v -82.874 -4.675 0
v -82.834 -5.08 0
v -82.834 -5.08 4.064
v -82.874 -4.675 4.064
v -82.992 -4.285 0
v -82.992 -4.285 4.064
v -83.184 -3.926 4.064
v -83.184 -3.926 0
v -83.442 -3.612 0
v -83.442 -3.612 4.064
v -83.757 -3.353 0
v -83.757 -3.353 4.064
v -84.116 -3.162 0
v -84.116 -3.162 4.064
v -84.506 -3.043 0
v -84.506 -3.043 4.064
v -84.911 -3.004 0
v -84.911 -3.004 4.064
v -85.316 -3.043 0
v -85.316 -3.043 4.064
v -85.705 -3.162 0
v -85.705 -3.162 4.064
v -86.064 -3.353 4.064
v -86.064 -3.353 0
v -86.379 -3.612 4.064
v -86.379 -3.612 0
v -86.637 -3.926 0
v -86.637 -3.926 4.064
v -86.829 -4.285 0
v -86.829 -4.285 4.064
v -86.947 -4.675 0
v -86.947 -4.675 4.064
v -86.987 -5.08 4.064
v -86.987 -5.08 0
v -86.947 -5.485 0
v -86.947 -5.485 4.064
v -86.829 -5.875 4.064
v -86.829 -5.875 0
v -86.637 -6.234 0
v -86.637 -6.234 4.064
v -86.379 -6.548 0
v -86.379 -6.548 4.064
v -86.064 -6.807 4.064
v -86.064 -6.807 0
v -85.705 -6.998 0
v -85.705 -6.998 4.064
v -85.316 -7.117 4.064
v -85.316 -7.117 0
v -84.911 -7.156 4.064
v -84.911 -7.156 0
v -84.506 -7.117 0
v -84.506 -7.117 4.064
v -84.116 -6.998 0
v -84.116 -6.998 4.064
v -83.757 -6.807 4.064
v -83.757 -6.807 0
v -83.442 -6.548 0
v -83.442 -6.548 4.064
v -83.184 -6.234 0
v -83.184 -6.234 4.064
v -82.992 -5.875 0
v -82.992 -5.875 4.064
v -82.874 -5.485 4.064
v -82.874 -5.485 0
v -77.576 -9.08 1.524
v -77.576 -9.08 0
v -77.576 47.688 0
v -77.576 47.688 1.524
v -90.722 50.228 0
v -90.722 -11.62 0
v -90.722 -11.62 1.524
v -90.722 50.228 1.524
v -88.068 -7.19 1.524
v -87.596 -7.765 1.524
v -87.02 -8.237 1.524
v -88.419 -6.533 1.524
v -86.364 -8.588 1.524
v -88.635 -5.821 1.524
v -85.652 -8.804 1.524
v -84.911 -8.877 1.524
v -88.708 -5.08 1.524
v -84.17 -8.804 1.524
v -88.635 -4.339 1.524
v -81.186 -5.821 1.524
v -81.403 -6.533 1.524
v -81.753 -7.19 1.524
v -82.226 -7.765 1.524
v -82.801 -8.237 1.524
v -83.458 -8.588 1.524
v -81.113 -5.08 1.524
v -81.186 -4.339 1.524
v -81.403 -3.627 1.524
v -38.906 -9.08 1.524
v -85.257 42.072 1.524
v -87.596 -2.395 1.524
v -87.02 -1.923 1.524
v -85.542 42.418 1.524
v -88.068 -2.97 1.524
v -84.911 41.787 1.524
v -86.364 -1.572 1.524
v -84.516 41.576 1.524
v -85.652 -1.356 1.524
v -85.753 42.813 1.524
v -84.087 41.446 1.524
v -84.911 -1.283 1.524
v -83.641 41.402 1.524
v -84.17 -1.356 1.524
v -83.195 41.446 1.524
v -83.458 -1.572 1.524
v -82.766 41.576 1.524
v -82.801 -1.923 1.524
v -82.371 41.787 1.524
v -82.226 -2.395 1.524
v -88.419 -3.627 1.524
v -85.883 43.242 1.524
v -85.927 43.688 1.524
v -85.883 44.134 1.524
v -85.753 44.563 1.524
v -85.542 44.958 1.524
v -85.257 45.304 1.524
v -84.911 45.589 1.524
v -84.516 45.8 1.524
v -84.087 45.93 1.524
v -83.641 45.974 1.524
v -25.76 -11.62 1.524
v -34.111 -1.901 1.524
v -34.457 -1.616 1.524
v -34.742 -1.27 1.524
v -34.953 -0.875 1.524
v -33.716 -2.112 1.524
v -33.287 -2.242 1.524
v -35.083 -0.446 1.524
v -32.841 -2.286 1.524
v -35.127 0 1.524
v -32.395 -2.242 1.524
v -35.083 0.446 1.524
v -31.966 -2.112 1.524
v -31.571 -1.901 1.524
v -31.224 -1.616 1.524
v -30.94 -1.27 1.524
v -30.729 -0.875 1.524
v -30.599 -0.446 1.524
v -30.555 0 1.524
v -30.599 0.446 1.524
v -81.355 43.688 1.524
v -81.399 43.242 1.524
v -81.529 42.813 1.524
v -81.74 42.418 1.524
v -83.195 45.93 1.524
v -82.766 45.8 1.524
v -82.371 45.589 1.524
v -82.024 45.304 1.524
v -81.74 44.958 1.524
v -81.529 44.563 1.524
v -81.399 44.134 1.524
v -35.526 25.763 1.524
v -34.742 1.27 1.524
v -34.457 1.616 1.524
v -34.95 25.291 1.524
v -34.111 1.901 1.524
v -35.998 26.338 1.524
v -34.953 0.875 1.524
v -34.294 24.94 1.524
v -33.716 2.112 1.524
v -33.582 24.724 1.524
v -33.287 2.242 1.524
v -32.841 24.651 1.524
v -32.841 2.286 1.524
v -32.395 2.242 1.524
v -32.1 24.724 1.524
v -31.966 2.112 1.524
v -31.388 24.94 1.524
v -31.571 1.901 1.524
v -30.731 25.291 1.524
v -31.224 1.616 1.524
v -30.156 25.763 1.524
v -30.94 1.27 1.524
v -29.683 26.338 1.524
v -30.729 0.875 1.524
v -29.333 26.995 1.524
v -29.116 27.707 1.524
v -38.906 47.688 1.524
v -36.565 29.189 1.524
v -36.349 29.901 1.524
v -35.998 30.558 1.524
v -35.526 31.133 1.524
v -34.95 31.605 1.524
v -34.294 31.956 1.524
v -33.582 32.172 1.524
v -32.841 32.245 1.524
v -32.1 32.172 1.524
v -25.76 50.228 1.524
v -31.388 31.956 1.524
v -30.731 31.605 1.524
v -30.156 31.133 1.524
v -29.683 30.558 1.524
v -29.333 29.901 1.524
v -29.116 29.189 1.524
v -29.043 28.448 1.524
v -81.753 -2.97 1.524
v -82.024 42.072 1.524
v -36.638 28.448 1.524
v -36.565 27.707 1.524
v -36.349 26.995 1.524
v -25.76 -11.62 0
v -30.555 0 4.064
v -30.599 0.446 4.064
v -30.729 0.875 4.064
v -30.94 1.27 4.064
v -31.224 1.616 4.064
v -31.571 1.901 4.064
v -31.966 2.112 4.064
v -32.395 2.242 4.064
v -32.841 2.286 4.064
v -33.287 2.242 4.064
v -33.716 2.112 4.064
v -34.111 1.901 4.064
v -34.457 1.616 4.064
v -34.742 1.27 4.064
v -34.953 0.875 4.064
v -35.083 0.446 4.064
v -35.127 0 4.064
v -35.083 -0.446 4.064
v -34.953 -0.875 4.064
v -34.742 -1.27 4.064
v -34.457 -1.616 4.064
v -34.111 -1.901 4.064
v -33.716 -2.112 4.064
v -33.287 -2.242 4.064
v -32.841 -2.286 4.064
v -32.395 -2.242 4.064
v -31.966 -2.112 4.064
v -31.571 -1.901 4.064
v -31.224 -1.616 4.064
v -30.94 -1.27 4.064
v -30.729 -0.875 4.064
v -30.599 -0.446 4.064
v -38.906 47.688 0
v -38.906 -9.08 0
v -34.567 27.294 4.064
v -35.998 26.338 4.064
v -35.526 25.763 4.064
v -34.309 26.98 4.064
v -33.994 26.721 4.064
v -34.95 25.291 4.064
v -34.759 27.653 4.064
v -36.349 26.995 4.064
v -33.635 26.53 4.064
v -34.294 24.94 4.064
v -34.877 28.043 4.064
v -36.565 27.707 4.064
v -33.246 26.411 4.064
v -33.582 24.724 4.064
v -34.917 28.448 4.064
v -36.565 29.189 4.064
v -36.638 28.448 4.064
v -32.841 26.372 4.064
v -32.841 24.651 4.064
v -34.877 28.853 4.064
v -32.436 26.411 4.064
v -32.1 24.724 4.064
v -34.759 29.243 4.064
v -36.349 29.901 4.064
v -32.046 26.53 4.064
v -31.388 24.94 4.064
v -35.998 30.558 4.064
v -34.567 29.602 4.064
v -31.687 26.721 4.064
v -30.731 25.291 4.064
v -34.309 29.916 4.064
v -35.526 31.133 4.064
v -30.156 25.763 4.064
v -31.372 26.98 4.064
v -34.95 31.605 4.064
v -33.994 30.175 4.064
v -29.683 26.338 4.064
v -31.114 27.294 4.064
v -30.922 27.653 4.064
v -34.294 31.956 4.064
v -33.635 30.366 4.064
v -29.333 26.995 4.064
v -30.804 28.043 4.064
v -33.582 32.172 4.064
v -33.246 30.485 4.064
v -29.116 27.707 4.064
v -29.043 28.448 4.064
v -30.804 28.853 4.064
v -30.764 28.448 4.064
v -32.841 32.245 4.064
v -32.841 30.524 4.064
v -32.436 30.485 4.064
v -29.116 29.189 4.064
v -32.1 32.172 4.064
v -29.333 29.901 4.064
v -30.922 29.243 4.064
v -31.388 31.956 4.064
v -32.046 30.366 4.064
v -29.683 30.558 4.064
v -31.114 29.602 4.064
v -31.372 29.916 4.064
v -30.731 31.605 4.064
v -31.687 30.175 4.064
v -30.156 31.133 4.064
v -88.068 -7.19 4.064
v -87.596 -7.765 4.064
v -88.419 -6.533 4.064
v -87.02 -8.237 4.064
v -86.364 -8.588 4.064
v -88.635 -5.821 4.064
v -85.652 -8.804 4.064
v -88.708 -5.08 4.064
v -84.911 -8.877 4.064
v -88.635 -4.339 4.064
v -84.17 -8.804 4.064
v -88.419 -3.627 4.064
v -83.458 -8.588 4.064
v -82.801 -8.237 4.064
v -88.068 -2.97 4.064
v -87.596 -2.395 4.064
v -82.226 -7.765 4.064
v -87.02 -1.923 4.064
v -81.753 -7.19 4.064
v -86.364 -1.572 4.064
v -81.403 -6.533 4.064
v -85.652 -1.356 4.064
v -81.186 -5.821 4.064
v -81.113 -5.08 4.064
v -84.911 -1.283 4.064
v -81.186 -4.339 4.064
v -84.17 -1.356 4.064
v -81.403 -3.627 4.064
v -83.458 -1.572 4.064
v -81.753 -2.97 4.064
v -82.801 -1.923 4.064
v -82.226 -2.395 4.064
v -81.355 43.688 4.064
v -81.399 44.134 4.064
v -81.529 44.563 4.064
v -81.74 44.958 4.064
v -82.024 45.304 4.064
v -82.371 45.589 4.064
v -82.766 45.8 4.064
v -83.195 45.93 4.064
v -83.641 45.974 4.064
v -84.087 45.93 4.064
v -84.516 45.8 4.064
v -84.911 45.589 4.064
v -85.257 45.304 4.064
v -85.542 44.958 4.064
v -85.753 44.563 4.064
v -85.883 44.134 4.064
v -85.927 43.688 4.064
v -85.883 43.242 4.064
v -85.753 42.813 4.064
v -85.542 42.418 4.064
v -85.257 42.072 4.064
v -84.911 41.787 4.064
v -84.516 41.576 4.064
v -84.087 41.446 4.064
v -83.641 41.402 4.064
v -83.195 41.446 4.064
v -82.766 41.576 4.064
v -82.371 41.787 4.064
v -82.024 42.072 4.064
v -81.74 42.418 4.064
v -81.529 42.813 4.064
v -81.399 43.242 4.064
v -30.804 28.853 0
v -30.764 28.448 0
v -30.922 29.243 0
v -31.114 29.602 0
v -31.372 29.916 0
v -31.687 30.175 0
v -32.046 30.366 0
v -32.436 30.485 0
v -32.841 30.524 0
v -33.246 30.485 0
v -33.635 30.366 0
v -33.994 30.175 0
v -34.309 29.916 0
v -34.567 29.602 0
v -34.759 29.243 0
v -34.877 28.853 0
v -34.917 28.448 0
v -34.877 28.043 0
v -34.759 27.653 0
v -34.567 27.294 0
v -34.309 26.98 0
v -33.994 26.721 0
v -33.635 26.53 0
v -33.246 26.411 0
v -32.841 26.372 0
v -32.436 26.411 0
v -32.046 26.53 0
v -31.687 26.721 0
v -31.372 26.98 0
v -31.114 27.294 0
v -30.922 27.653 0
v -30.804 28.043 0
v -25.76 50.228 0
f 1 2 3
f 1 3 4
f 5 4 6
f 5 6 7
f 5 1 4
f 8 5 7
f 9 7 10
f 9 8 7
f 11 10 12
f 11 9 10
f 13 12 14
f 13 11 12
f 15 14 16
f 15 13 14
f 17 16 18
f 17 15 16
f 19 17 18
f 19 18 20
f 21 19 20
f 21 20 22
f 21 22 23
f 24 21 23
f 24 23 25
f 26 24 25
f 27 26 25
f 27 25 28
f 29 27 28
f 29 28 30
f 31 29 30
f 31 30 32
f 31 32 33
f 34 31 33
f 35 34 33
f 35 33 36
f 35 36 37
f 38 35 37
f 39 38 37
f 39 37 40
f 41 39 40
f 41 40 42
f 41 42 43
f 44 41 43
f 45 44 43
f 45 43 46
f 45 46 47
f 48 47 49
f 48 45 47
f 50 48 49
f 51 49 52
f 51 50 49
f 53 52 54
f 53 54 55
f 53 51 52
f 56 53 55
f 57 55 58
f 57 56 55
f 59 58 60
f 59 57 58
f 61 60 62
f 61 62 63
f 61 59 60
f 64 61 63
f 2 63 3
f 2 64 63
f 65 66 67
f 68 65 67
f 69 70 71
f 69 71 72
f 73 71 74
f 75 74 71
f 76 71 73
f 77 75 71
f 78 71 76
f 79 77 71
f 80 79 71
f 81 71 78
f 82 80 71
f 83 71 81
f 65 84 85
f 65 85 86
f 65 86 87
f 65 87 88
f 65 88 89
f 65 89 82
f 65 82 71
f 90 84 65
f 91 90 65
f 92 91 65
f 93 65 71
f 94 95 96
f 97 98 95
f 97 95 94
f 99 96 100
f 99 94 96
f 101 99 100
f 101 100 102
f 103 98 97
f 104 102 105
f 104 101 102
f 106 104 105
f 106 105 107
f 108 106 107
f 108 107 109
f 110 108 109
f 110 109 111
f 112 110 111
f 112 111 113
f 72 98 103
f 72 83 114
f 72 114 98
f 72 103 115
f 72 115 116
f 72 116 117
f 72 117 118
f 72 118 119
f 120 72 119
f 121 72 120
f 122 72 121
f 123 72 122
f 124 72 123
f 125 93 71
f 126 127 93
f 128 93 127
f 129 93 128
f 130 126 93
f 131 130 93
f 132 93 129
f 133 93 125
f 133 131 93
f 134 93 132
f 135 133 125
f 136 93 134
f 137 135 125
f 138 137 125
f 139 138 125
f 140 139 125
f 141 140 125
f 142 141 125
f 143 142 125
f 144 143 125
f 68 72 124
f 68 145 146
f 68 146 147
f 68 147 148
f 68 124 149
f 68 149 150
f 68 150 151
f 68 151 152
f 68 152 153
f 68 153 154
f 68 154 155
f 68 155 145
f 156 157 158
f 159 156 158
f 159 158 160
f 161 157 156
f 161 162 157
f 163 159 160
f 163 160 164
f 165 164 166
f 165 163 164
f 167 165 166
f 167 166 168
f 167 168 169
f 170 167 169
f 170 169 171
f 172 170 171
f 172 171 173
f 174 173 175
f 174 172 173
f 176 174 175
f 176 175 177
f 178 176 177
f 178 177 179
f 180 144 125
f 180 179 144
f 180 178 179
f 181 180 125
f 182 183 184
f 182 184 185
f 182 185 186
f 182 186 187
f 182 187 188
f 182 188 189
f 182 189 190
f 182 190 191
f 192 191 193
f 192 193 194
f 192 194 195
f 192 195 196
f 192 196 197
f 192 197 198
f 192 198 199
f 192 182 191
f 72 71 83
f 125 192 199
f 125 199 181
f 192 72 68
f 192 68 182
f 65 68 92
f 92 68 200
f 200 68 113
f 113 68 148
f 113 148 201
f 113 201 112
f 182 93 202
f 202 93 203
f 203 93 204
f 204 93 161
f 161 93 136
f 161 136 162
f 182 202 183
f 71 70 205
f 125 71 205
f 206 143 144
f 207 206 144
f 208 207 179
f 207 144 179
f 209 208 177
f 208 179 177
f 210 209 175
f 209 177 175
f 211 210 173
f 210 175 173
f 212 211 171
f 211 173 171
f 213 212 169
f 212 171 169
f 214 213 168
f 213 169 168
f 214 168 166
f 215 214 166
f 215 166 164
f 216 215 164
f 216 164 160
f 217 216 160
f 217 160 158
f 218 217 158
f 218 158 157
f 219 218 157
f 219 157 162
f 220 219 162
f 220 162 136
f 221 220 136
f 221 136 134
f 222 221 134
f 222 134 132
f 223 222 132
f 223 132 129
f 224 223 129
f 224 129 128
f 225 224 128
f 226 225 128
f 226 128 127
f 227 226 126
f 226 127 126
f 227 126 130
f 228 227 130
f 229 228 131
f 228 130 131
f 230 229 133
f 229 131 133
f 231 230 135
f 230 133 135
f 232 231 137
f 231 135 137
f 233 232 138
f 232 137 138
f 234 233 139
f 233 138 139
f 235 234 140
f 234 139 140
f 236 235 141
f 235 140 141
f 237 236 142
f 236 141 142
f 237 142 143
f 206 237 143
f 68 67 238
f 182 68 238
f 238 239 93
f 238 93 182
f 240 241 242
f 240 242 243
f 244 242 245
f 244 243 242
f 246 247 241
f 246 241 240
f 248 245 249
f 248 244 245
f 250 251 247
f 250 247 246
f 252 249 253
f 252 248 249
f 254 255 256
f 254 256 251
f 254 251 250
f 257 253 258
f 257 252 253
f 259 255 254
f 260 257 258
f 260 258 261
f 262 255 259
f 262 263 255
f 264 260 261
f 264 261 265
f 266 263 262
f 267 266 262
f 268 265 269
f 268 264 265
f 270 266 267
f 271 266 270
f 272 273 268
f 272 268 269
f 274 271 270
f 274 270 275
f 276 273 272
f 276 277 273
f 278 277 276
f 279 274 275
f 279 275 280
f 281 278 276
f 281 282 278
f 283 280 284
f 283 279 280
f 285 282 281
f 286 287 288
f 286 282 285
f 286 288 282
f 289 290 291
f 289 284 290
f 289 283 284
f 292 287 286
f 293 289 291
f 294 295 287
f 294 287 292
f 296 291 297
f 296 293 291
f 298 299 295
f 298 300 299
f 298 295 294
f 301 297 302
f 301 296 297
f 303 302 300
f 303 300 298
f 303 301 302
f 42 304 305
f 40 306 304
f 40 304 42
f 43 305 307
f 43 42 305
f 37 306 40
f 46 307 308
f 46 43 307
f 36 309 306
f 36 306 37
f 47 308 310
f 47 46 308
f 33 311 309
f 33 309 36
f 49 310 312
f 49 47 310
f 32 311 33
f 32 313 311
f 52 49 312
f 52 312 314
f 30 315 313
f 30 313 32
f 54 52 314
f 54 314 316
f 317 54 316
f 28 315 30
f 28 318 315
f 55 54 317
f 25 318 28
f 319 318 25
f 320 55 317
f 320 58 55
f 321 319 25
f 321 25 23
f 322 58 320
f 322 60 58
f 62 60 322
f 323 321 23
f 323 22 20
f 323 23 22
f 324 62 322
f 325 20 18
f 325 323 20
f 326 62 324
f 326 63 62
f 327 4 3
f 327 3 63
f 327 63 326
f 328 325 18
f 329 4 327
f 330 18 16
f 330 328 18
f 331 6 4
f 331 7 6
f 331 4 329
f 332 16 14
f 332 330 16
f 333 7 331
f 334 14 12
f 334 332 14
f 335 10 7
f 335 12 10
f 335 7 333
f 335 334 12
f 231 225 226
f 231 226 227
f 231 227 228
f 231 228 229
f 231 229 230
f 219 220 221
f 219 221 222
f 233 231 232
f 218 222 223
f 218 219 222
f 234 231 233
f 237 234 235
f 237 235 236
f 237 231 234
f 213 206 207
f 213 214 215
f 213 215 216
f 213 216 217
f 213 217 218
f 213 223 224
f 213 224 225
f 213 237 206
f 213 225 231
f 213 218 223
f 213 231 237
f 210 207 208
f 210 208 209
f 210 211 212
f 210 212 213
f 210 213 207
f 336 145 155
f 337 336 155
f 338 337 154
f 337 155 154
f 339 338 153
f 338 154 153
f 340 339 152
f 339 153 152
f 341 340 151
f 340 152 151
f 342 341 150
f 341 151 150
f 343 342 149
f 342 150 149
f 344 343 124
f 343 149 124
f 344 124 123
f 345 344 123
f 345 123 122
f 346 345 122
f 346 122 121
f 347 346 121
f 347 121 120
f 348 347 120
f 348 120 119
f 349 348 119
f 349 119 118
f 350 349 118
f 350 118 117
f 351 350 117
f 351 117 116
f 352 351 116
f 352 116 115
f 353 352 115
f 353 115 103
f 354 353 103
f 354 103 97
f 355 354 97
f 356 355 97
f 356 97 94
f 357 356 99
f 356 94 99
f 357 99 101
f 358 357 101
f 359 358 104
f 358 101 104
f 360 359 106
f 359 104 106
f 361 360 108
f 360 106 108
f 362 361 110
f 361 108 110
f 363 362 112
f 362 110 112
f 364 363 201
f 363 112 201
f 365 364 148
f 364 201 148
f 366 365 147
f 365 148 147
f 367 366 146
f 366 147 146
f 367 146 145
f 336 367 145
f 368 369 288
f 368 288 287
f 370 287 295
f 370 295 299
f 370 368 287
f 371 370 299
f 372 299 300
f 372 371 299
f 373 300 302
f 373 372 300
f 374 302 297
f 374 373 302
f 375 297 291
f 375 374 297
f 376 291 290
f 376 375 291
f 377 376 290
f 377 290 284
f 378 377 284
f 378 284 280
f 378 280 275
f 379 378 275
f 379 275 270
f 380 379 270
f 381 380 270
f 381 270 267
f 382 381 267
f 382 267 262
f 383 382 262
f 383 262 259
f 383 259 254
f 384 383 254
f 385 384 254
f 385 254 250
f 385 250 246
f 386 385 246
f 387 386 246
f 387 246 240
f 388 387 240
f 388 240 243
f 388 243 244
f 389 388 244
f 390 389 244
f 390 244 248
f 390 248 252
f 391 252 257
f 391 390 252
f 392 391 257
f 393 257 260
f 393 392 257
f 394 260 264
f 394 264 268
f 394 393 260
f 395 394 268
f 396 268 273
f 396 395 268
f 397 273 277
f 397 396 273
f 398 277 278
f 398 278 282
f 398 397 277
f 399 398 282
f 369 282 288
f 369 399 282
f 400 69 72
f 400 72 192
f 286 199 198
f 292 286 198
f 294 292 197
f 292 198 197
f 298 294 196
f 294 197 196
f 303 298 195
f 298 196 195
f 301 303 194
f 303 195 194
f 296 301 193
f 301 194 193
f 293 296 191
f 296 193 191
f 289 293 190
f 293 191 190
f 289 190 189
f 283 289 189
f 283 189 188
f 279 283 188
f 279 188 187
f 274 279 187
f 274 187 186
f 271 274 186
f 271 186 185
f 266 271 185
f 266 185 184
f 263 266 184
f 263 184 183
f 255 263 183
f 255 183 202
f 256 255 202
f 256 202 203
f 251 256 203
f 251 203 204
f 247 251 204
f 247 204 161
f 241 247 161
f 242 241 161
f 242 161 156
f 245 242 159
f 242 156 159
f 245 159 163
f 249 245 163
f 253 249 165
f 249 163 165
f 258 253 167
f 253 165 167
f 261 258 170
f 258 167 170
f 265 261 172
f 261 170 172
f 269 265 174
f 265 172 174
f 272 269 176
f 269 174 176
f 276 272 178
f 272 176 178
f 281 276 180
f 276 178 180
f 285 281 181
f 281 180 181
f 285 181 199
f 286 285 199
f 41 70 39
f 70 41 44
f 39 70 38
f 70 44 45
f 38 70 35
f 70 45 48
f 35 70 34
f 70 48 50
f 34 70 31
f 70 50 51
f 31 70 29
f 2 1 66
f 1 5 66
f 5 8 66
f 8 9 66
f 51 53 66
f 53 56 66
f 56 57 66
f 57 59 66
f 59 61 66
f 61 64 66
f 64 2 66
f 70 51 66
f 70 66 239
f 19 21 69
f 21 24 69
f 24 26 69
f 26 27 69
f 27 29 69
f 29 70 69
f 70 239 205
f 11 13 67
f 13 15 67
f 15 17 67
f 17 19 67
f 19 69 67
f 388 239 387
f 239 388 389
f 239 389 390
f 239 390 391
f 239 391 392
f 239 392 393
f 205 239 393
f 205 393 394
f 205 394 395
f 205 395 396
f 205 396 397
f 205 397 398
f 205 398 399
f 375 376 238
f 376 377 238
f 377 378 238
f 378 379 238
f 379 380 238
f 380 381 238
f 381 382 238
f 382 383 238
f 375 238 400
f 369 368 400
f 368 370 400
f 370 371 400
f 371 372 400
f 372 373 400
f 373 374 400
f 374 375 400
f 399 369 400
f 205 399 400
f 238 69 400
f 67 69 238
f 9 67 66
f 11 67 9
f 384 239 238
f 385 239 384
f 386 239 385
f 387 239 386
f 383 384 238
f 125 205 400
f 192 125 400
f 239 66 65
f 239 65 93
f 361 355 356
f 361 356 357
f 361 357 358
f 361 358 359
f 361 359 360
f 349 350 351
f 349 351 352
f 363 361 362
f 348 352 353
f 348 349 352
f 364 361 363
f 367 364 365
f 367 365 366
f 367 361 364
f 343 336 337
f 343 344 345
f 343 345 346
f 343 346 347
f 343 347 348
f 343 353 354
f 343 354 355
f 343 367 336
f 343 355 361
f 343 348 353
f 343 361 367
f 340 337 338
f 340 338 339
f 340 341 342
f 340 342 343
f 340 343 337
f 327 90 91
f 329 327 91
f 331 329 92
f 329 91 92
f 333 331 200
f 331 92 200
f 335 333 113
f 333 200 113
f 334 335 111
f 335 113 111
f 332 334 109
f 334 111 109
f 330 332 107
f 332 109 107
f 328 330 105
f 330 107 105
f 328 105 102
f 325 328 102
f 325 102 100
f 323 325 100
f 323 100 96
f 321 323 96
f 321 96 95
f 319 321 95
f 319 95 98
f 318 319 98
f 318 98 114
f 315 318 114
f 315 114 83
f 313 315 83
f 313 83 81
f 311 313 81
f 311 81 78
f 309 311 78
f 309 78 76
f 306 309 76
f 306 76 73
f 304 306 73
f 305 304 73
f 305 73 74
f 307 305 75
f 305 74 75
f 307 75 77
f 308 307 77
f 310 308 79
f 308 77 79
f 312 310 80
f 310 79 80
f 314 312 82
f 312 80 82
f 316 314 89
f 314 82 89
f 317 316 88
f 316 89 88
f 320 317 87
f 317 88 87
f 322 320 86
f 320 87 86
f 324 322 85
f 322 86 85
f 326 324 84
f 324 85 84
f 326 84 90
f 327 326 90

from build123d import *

# Parameters (mm, degrees)
F4_W     = 64.961583
F4_H     = 61.849
F4_W_2   = 38.670417
F4_H_2   = 56.769
F5_DEPTH = 1.524
F1_R     = 3.7973
F1_R_2   = 2.07645
F1_R_3   = 2.286
F6_DEPTH = 4.064
F7_DEPTH = 25.4


with BuildPart() as f5:
    # F4 (on Top) → F5 (new body)
    with BuildSketch(Plane.XY):
        with Locations((-58.240771, 19.304)):
            Rectangle(F4_W, F4_H)
        with Locations((-58.240772, 19.304)):
            Rectangle(F4_W_2, F4_H_2, mode=Mode.SUBTRACT)
    extrude(amount=F5_DEPTH)

    # F1 (on Top) → F6 (join)
    with BuildSketch(Plane.XY):
        with Locations((-84.910771, -5.08)):
            Circle(F1_R)
        with Locations((-84.910771, -5.08)):
            Circle(F1_R_2, mode=Mode.SUBTRACT)
        with Locations((-83.640771, 43.688)):
            Circle(F1_R_3)
        with Locations((-32.840771, 0)):
            Circle(F1_R_3)
        with Locations((-32.840771, 28.448)):
            Circle(F1_R)
        with Locations((-32.840771, 28.448)):
            Circle(F1_R_2, mode=Mode.SUBTRACT)
    extrude(amount=F6_DEPTH)

    # F1 (on Top) → F7 (cut)
    with BuildSketch(Plane.XY):
        with Locations((-84.910771, -5.08)):
            Circle(F1_R_2)
        with Locations((-32.840771, 28.448)):
            Circle(F1_R_2)
    extrude(amount=F7_DEPTH, mode=Mode.SUBTRACT)


solid = f5.part
